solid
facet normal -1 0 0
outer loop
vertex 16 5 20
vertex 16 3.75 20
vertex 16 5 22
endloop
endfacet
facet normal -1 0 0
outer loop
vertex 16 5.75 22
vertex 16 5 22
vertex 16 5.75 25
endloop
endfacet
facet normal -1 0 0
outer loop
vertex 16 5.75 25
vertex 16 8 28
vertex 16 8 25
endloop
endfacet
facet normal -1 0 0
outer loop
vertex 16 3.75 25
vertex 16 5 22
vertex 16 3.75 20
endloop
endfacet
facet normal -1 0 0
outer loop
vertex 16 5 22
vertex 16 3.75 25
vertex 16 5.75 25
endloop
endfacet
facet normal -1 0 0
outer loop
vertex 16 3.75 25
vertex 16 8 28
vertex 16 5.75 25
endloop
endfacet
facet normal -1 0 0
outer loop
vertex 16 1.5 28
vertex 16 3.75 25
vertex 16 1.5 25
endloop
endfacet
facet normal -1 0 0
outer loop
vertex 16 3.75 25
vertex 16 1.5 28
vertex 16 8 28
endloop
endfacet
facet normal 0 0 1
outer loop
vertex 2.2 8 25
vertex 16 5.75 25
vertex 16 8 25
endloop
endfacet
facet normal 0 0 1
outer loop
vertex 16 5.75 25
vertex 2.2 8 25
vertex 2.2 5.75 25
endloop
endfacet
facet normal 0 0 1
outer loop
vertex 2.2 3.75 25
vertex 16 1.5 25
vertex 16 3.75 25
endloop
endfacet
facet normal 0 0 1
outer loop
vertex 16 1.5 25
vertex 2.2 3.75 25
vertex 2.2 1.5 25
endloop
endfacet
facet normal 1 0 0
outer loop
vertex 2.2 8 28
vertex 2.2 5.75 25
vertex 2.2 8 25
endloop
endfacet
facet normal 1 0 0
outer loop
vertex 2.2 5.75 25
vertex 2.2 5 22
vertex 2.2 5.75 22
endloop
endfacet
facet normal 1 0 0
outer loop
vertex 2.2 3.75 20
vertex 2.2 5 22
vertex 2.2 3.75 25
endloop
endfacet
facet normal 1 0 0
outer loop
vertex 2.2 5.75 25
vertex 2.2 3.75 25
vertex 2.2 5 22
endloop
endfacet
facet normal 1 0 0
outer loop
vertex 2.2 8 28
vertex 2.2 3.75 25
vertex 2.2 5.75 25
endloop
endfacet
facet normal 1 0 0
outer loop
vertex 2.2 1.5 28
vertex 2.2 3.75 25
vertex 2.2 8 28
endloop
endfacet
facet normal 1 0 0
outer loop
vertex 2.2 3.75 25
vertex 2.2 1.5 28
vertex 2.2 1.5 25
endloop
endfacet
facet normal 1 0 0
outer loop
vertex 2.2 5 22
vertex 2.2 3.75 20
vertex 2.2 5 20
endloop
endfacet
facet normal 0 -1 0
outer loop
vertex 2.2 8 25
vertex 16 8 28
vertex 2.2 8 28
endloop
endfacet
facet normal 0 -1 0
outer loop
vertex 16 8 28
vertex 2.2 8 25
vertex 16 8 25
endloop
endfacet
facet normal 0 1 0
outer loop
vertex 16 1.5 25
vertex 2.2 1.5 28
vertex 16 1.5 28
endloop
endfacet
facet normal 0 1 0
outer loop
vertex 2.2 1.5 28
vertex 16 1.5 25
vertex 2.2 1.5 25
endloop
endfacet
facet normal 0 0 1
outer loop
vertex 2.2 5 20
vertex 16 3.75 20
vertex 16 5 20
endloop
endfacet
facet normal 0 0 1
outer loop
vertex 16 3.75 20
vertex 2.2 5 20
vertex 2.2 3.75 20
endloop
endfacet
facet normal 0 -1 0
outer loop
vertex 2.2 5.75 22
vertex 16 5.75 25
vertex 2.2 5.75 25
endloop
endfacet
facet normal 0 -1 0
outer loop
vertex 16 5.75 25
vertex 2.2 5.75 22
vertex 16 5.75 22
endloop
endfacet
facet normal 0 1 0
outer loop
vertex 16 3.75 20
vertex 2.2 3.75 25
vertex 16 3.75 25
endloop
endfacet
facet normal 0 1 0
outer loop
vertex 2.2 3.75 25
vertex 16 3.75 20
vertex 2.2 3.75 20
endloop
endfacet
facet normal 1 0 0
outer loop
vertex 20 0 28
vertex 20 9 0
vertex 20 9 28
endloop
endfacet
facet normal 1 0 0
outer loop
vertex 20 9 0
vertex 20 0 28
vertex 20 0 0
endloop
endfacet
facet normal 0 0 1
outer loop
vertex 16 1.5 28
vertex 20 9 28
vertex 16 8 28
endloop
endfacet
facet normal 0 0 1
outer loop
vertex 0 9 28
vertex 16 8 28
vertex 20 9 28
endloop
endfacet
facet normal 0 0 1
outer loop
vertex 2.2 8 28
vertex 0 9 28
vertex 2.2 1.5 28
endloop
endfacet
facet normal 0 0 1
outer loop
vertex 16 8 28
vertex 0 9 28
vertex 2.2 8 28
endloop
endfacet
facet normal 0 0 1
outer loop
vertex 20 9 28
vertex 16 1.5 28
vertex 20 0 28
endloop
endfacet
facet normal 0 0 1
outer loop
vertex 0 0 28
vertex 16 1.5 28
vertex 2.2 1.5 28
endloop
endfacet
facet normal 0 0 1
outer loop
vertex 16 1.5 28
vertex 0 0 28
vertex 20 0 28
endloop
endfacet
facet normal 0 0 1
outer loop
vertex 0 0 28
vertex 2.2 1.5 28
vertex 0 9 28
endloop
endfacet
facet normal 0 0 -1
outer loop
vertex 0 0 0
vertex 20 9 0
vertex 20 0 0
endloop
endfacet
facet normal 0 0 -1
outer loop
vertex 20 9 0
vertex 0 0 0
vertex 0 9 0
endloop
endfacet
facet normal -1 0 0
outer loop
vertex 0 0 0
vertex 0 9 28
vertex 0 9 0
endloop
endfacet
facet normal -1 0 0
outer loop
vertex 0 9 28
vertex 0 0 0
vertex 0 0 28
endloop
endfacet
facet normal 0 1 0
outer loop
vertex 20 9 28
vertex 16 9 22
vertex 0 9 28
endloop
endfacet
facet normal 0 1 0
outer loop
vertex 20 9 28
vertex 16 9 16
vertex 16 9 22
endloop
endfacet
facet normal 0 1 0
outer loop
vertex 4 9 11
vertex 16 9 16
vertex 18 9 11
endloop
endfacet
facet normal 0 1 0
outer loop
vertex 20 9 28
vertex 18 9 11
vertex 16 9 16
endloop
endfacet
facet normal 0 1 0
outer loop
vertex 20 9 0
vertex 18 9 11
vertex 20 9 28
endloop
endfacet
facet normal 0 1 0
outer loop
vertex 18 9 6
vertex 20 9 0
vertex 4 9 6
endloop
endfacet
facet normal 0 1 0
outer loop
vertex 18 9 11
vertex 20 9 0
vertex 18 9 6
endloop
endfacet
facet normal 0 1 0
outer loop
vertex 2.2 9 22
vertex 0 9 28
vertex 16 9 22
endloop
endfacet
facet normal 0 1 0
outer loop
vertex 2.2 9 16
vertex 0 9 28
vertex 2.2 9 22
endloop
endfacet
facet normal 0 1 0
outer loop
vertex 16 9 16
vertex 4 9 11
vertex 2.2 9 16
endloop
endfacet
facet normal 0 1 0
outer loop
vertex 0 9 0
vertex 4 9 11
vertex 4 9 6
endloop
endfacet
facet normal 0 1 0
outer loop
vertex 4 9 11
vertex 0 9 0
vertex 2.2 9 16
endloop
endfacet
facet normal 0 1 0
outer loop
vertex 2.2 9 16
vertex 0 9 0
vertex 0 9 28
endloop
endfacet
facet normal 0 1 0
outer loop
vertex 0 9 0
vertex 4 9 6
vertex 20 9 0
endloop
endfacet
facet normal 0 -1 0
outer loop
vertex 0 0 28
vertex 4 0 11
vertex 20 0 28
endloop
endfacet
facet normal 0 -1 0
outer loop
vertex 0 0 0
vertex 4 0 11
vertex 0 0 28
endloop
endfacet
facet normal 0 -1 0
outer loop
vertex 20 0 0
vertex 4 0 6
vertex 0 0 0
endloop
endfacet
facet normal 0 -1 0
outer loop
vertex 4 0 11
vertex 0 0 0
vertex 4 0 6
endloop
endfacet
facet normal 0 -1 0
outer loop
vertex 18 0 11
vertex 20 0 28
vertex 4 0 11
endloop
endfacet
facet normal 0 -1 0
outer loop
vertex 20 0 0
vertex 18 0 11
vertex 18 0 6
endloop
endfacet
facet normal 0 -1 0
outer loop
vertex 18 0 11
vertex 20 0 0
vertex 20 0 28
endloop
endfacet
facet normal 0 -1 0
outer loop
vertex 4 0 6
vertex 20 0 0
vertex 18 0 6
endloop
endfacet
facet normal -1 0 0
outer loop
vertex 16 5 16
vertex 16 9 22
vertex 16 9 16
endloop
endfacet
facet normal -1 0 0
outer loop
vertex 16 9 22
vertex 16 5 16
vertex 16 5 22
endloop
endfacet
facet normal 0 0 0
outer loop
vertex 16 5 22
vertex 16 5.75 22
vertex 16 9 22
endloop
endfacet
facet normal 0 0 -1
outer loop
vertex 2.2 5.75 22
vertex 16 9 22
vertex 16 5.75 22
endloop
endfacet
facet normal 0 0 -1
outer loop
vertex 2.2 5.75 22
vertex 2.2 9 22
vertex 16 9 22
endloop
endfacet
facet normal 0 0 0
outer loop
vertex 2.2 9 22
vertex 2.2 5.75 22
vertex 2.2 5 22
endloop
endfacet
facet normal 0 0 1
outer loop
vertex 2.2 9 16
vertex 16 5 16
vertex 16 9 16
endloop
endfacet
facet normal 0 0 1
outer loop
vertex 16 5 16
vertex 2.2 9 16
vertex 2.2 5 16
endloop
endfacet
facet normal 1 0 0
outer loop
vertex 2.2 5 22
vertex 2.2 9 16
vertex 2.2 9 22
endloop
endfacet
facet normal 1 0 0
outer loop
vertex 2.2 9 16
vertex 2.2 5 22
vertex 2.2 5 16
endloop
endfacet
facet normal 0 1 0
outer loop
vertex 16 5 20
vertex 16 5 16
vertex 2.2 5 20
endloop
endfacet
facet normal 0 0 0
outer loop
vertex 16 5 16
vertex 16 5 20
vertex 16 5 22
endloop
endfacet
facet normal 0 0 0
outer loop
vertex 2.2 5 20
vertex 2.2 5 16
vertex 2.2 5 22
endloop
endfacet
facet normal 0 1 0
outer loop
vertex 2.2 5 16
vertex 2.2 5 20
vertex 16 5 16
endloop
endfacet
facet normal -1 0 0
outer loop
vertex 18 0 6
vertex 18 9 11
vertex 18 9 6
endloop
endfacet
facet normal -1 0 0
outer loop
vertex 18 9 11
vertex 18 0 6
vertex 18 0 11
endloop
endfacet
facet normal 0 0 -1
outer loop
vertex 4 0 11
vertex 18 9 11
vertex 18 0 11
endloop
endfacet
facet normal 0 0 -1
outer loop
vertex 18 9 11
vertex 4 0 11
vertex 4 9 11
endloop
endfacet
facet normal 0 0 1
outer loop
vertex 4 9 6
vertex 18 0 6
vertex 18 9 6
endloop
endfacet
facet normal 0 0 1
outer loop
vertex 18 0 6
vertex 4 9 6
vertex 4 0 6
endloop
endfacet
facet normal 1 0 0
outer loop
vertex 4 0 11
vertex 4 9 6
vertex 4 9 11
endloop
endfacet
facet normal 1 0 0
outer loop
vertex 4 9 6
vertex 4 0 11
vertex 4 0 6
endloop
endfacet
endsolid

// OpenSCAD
SWITCH_SIZE_X = 13.8;
SWITCH_SIZE_Y = 6.5;
SWITCH_SIZE_Z = 5;


module switch() {
    cube([SWITCH_SIZE_X, SWITCH_SIZE_Y, SWITCH_SIZE_Z]);
    translate([0, SWITCH_SIZE_Y/2-1, -5]) {
        cube([SWITCH_SIZE_X, 2, 5]);
    }
    
}

//switch();

difference() {
    cube([20, 9, 28]);
    translate([(20-4-SWITCH_SIZE_X), 1.5, 25]) switch();
    translate([(20-4-SWITCH_SIZE_X),5, 16]) cube([SWITCH_SIZE_X, 20, 6]);
    
    translate([4, -1, 6]) cube([14, 20, 5]);
}
